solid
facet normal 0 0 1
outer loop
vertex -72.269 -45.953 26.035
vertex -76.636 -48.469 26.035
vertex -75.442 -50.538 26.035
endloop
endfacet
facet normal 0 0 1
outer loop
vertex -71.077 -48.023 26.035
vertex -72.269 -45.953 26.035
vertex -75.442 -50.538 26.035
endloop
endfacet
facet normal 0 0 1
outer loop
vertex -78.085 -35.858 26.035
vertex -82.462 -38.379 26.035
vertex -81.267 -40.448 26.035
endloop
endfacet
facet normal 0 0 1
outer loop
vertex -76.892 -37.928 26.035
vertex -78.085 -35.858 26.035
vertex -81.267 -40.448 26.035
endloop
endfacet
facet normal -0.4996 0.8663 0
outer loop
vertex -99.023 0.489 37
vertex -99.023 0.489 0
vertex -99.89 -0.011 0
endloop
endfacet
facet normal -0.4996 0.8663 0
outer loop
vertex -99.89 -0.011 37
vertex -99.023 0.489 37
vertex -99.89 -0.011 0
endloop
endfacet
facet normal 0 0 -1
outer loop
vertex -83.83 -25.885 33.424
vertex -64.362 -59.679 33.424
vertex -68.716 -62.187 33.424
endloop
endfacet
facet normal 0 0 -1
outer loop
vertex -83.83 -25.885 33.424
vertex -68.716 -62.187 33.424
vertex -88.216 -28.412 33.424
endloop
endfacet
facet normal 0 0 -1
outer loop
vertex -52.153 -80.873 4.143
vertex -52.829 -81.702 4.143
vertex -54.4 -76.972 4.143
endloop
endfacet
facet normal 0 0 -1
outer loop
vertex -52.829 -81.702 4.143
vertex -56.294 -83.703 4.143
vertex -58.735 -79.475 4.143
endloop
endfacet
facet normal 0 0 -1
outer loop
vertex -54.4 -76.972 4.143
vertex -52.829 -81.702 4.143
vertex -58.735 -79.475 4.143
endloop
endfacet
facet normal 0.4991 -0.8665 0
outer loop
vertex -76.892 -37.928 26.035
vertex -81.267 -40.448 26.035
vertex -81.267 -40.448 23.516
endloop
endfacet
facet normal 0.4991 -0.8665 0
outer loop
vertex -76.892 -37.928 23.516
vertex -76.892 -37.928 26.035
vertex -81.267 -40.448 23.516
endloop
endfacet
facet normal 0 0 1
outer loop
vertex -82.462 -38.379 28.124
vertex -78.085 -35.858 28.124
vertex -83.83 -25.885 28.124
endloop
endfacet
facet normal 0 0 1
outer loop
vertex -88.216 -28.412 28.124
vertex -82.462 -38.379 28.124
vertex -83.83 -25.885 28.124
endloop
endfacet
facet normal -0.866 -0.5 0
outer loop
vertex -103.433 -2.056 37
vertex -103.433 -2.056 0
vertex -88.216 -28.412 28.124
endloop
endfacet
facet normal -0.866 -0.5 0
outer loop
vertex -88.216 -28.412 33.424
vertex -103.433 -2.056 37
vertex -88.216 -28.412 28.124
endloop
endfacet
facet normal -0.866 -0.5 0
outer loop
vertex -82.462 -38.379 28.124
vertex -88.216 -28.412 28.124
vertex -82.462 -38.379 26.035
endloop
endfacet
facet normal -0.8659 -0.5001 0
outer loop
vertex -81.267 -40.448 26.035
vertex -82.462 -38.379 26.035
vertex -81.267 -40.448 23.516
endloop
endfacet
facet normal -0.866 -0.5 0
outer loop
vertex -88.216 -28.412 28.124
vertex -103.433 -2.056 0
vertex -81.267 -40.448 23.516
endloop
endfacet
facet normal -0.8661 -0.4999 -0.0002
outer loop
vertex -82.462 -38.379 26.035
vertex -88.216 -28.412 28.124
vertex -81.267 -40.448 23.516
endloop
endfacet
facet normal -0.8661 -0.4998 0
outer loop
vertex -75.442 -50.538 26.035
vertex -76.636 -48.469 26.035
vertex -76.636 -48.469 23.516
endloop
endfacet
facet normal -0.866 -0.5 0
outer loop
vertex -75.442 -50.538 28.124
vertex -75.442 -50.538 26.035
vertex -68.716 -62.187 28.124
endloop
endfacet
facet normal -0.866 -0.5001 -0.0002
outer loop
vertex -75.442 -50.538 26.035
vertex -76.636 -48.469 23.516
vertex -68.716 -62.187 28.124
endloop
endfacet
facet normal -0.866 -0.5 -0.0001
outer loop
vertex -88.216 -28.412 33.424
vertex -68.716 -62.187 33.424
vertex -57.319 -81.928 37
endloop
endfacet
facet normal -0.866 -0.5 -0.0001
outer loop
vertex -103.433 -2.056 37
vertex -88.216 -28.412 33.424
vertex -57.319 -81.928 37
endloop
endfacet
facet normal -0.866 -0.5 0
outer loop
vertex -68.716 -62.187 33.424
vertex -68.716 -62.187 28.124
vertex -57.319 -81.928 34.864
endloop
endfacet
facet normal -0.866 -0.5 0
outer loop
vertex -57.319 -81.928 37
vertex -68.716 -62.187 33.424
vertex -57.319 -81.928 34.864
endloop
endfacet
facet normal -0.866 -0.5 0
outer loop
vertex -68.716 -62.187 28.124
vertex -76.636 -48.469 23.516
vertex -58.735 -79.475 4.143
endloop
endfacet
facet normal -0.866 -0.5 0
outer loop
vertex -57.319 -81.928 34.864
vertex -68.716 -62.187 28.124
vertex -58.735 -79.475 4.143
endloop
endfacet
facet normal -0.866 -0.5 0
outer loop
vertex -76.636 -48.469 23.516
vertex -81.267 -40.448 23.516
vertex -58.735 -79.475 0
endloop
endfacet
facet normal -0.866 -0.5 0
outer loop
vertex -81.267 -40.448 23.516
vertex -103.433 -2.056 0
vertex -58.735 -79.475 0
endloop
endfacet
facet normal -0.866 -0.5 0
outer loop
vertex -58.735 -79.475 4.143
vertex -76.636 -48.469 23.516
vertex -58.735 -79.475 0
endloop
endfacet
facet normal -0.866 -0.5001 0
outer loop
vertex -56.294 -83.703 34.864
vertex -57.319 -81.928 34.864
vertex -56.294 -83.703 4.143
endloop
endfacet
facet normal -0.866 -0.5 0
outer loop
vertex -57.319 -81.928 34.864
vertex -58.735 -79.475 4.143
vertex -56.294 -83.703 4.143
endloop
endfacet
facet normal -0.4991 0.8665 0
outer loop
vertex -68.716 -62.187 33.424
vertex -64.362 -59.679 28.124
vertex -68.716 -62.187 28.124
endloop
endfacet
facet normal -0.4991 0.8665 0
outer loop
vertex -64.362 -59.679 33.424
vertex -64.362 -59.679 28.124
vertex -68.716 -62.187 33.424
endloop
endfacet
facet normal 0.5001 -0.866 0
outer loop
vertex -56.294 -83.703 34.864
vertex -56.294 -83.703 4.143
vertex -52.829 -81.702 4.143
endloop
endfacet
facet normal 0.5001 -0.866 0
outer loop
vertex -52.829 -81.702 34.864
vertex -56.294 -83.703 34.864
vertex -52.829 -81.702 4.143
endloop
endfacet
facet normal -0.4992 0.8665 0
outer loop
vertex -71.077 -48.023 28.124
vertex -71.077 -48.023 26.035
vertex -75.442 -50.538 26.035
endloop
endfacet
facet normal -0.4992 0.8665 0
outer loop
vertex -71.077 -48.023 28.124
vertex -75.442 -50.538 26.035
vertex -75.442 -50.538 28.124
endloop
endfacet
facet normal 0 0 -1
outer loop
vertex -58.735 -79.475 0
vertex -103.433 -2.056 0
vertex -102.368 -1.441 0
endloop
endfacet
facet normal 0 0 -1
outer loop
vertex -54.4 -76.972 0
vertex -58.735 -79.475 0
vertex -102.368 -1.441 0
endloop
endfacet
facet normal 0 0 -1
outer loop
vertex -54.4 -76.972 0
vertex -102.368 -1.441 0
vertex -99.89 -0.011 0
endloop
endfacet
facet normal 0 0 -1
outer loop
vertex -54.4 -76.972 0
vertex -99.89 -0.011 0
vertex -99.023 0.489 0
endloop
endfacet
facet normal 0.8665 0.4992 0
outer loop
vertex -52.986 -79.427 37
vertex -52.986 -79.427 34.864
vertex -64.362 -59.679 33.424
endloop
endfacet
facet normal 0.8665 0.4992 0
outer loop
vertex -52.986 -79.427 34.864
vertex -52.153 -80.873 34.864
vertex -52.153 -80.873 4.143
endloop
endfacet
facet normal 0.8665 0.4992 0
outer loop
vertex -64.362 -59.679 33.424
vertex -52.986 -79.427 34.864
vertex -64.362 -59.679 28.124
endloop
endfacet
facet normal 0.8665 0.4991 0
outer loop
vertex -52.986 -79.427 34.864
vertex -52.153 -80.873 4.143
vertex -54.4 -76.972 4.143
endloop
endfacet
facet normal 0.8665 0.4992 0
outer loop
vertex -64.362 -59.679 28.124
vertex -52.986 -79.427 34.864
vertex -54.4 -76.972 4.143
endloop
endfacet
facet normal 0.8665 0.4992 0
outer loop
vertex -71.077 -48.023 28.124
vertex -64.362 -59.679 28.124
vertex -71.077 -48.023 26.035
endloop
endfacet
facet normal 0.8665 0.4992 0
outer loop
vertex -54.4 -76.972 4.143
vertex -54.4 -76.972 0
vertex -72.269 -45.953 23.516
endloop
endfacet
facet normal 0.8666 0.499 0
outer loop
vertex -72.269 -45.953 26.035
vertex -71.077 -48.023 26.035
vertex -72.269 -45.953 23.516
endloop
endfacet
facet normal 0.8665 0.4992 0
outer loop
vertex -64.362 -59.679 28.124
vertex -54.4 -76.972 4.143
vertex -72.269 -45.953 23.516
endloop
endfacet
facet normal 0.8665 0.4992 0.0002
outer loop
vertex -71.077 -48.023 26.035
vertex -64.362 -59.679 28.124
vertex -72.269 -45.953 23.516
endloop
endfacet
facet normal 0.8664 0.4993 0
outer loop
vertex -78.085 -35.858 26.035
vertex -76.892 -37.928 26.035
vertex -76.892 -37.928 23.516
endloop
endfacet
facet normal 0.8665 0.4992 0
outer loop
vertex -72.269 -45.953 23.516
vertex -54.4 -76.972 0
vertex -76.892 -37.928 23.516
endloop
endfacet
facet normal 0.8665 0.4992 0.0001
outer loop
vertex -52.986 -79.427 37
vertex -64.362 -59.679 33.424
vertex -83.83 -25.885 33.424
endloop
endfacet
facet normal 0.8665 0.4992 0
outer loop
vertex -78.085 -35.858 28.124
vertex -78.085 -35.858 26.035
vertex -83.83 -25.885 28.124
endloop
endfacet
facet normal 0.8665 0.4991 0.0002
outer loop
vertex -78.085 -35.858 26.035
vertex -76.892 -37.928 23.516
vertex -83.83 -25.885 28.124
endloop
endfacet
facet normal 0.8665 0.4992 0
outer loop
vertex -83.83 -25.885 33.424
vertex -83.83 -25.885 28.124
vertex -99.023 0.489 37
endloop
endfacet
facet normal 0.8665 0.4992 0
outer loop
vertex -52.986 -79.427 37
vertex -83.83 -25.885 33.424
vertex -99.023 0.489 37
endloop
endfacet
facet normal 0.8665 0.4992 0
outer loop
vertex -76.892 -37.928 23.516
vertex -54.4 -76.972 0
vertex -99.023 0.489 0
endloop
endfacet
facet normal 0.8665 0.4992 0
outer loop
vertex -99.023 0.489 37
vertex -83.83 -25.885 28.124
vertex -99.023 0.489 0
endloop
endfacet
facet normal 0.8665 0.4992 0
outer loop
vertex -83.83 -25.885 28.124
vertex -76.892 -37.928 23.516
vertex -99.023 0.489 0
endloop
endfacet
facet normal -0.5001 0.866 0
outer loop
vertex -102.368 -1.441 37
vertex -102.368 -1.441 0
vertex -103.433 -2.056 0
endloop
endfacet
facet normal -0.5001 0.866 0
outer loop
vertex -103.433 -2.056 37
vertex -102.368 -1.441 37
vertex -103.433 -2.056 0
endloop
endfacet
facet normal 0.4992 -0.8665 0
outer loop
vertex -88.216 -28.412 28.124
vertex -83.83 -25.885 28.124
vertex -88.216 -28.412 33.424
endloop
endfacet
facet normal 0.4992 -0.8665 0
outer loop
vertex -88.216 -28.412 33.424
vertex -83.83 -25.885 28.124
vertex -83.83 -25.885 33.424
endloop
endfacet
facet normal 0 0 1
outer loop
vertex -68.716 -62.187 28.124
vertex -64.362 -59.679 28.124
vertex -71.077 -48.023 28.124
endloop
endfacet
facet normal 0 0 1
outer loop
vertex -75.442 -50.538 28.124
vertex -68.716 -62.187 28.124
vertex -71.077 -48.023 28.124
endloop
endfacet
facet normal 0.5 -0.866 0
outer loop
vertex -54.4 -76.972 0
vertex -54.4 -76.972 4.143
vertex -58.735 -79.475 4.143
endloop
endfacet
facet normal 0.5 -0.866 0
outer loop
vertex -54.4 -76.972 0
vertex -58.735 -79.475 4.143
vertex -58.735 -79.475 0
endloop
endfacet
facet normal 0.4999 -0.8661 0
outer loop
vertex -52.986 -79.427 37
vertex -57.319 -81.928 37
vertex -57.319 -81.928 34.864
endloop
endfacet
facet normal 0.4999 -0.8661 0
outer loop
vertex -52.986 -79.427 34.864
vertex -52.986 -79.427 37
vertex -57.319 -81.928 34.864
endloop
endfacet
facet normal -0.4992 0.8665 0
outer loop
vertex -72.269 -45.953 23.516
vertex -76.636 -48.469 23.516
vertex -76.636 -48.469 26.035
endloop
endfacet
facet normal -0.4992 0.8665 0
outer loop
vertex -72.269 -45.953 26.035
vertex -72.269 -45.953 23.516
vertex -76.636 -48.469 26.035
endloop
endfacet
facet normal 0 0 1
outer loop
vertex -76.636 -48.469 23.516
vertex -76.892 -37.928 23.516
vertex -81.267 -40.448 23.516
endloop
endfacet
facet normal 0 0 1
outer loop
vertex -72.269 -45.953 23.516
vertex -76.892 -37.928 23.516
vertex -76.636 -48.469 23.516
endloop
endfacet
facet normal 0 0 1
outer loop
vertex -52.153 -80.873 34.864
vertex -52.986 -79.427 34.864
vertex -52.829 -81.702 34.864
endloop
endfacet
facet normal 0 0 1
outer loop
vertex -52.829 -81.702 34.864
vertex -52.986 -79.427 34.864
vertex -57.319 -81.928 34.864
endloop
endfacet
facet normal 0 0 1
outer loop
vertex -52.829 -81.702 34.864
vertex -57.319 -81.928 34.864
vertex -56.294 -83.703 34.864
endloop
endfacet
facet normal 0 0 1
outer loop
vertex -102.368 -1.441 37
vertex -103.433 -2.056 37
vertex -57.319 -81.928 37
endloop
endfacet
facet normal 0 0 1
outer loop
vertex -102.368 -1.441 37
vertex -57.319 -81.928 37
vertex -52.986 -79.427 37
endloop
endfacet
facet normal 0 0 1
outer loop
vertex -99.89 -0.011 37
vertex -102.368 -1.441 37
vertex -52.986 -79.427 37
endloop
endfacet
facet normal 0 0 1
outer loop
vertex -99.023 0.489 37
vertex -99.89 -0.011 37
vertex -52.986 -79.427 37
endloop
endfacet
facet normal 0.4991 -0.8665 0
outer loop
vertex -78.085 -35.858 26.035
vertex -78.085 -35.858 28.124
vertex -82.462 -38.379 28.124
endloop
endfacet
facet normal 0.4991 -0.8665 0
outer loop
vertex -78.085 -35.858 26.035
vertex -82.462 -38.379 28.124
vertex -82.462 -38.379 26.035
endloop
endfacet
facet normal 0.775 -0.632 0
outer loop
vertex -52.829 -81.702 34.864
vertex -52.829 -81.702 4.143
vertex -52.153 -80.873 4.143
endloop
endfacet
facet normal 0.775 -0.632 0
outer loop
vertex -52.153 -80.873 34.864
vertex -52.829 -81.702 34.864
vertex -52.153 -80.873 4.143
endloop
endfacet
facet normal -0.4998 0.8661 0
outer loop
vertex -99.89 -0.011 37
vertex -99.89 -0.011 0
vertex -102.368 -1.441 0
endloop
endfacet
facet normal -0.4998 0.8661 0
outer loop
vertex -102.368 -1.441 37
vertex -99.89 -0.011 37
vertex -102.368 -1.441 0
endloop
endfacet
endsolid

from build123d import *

# Parameters (mm, degrees)
SALIENTE_EXTRUIR1_DEPTH = 37
CORTAR_EXTRUIR1_DEPTH   = 11
CROQUIS4_W              = 5.3
CROQUIS4_H              = 39
CORTAR_EXTRUIR2_DEPTH   = 10
CORTAR_EXTRUIR3_DEPTH   = 7


with BuildPart() as part:
    # Croquis1 → Saliente-Extruir1 (new body)
    with BuildSketch(Plane.XY):
        Polygon((-99.889669891, -0.010626503), (-102.367816062, -1.441384861), (-103.432664129, -2.05617518), (-56.294122108, -83.702524956), (-52.829274, -81.702093968), (-52.153107423, -80.87251983), (-99.02316632, 0.48854437), align=None)
    extrude(amount=SALIENTE_EXTRUIR1_DEPTH)

    # Croquis2 → Cortar-Extruir1 (cut)
    with BuildSketch(Plane(origin=(-78.464848067, -45.301701153, 0), x_dir=(0, 0, 1), z_dir=(-0.866025404, -0.5, 0))):
        Polygon((4.142527364, -44.341451899), (4.142527364, -39.459427934), (0, -39.459427934), (-0.114610865, -39.459427934), (-0.114610865, -44.663143407), (4.142527364, -44.663143407), align=None)
        Polygon((34.863722121, -44.341451919), (34.863722121, -42.292638437), (37, -42.292638437), (37.495969664, -42.292638437), (37.495969664, -44.984834896), (34.863722121, -44.984834896), align=None)
    extrude(amount=-CORTAR_EXTRUIR1_DEPTH, mode=Mode.SUBTRACT)

    # Croquis4 → Cortar-Extruir2 (cut)
    with BuildSketch(Plane(origin=(-74.09577594, -42.782555705, 0), x_dir=(0, 0, 1), z_dir=(-0.866503572, -0.499170873, 0))):
        with Locations((30.774409531, 0.000869875)):
            Rectangle(CROQUIS4_W, CROQUIS4_H)
    extrude(amount=CORTAR_EXTRUIR2_DEPTH, mode=Mode.SUBTRACT)

    # Croquis5 → Cortar-Extruir3 (cut)
    with BuildSketch(Plane(origin=(-74.09577594, -42.782555705, 0), x_dir=(0, 0, 1), z_dir=(-0.866503572, -0.499170873, 0))):
        Polygon((28.224409531, 7.991554704), (26.034587607, 7.991554704), (26.034587607, 5.602236085), (23.516116629, 5.602236085), (23.516116629, -3.658890685), (26.034587607, -3.658890685), (26.034587607, -6.048209304), (28.224409531, -6.048209304), (28.726361193, -6.048209304), (28.726361193, 7.991554704), align=None)
    extrude(amount=CORTAR_EXTRUIR3_DEPTH, mode=Mode.SUBTRACT)


solid = part.part
